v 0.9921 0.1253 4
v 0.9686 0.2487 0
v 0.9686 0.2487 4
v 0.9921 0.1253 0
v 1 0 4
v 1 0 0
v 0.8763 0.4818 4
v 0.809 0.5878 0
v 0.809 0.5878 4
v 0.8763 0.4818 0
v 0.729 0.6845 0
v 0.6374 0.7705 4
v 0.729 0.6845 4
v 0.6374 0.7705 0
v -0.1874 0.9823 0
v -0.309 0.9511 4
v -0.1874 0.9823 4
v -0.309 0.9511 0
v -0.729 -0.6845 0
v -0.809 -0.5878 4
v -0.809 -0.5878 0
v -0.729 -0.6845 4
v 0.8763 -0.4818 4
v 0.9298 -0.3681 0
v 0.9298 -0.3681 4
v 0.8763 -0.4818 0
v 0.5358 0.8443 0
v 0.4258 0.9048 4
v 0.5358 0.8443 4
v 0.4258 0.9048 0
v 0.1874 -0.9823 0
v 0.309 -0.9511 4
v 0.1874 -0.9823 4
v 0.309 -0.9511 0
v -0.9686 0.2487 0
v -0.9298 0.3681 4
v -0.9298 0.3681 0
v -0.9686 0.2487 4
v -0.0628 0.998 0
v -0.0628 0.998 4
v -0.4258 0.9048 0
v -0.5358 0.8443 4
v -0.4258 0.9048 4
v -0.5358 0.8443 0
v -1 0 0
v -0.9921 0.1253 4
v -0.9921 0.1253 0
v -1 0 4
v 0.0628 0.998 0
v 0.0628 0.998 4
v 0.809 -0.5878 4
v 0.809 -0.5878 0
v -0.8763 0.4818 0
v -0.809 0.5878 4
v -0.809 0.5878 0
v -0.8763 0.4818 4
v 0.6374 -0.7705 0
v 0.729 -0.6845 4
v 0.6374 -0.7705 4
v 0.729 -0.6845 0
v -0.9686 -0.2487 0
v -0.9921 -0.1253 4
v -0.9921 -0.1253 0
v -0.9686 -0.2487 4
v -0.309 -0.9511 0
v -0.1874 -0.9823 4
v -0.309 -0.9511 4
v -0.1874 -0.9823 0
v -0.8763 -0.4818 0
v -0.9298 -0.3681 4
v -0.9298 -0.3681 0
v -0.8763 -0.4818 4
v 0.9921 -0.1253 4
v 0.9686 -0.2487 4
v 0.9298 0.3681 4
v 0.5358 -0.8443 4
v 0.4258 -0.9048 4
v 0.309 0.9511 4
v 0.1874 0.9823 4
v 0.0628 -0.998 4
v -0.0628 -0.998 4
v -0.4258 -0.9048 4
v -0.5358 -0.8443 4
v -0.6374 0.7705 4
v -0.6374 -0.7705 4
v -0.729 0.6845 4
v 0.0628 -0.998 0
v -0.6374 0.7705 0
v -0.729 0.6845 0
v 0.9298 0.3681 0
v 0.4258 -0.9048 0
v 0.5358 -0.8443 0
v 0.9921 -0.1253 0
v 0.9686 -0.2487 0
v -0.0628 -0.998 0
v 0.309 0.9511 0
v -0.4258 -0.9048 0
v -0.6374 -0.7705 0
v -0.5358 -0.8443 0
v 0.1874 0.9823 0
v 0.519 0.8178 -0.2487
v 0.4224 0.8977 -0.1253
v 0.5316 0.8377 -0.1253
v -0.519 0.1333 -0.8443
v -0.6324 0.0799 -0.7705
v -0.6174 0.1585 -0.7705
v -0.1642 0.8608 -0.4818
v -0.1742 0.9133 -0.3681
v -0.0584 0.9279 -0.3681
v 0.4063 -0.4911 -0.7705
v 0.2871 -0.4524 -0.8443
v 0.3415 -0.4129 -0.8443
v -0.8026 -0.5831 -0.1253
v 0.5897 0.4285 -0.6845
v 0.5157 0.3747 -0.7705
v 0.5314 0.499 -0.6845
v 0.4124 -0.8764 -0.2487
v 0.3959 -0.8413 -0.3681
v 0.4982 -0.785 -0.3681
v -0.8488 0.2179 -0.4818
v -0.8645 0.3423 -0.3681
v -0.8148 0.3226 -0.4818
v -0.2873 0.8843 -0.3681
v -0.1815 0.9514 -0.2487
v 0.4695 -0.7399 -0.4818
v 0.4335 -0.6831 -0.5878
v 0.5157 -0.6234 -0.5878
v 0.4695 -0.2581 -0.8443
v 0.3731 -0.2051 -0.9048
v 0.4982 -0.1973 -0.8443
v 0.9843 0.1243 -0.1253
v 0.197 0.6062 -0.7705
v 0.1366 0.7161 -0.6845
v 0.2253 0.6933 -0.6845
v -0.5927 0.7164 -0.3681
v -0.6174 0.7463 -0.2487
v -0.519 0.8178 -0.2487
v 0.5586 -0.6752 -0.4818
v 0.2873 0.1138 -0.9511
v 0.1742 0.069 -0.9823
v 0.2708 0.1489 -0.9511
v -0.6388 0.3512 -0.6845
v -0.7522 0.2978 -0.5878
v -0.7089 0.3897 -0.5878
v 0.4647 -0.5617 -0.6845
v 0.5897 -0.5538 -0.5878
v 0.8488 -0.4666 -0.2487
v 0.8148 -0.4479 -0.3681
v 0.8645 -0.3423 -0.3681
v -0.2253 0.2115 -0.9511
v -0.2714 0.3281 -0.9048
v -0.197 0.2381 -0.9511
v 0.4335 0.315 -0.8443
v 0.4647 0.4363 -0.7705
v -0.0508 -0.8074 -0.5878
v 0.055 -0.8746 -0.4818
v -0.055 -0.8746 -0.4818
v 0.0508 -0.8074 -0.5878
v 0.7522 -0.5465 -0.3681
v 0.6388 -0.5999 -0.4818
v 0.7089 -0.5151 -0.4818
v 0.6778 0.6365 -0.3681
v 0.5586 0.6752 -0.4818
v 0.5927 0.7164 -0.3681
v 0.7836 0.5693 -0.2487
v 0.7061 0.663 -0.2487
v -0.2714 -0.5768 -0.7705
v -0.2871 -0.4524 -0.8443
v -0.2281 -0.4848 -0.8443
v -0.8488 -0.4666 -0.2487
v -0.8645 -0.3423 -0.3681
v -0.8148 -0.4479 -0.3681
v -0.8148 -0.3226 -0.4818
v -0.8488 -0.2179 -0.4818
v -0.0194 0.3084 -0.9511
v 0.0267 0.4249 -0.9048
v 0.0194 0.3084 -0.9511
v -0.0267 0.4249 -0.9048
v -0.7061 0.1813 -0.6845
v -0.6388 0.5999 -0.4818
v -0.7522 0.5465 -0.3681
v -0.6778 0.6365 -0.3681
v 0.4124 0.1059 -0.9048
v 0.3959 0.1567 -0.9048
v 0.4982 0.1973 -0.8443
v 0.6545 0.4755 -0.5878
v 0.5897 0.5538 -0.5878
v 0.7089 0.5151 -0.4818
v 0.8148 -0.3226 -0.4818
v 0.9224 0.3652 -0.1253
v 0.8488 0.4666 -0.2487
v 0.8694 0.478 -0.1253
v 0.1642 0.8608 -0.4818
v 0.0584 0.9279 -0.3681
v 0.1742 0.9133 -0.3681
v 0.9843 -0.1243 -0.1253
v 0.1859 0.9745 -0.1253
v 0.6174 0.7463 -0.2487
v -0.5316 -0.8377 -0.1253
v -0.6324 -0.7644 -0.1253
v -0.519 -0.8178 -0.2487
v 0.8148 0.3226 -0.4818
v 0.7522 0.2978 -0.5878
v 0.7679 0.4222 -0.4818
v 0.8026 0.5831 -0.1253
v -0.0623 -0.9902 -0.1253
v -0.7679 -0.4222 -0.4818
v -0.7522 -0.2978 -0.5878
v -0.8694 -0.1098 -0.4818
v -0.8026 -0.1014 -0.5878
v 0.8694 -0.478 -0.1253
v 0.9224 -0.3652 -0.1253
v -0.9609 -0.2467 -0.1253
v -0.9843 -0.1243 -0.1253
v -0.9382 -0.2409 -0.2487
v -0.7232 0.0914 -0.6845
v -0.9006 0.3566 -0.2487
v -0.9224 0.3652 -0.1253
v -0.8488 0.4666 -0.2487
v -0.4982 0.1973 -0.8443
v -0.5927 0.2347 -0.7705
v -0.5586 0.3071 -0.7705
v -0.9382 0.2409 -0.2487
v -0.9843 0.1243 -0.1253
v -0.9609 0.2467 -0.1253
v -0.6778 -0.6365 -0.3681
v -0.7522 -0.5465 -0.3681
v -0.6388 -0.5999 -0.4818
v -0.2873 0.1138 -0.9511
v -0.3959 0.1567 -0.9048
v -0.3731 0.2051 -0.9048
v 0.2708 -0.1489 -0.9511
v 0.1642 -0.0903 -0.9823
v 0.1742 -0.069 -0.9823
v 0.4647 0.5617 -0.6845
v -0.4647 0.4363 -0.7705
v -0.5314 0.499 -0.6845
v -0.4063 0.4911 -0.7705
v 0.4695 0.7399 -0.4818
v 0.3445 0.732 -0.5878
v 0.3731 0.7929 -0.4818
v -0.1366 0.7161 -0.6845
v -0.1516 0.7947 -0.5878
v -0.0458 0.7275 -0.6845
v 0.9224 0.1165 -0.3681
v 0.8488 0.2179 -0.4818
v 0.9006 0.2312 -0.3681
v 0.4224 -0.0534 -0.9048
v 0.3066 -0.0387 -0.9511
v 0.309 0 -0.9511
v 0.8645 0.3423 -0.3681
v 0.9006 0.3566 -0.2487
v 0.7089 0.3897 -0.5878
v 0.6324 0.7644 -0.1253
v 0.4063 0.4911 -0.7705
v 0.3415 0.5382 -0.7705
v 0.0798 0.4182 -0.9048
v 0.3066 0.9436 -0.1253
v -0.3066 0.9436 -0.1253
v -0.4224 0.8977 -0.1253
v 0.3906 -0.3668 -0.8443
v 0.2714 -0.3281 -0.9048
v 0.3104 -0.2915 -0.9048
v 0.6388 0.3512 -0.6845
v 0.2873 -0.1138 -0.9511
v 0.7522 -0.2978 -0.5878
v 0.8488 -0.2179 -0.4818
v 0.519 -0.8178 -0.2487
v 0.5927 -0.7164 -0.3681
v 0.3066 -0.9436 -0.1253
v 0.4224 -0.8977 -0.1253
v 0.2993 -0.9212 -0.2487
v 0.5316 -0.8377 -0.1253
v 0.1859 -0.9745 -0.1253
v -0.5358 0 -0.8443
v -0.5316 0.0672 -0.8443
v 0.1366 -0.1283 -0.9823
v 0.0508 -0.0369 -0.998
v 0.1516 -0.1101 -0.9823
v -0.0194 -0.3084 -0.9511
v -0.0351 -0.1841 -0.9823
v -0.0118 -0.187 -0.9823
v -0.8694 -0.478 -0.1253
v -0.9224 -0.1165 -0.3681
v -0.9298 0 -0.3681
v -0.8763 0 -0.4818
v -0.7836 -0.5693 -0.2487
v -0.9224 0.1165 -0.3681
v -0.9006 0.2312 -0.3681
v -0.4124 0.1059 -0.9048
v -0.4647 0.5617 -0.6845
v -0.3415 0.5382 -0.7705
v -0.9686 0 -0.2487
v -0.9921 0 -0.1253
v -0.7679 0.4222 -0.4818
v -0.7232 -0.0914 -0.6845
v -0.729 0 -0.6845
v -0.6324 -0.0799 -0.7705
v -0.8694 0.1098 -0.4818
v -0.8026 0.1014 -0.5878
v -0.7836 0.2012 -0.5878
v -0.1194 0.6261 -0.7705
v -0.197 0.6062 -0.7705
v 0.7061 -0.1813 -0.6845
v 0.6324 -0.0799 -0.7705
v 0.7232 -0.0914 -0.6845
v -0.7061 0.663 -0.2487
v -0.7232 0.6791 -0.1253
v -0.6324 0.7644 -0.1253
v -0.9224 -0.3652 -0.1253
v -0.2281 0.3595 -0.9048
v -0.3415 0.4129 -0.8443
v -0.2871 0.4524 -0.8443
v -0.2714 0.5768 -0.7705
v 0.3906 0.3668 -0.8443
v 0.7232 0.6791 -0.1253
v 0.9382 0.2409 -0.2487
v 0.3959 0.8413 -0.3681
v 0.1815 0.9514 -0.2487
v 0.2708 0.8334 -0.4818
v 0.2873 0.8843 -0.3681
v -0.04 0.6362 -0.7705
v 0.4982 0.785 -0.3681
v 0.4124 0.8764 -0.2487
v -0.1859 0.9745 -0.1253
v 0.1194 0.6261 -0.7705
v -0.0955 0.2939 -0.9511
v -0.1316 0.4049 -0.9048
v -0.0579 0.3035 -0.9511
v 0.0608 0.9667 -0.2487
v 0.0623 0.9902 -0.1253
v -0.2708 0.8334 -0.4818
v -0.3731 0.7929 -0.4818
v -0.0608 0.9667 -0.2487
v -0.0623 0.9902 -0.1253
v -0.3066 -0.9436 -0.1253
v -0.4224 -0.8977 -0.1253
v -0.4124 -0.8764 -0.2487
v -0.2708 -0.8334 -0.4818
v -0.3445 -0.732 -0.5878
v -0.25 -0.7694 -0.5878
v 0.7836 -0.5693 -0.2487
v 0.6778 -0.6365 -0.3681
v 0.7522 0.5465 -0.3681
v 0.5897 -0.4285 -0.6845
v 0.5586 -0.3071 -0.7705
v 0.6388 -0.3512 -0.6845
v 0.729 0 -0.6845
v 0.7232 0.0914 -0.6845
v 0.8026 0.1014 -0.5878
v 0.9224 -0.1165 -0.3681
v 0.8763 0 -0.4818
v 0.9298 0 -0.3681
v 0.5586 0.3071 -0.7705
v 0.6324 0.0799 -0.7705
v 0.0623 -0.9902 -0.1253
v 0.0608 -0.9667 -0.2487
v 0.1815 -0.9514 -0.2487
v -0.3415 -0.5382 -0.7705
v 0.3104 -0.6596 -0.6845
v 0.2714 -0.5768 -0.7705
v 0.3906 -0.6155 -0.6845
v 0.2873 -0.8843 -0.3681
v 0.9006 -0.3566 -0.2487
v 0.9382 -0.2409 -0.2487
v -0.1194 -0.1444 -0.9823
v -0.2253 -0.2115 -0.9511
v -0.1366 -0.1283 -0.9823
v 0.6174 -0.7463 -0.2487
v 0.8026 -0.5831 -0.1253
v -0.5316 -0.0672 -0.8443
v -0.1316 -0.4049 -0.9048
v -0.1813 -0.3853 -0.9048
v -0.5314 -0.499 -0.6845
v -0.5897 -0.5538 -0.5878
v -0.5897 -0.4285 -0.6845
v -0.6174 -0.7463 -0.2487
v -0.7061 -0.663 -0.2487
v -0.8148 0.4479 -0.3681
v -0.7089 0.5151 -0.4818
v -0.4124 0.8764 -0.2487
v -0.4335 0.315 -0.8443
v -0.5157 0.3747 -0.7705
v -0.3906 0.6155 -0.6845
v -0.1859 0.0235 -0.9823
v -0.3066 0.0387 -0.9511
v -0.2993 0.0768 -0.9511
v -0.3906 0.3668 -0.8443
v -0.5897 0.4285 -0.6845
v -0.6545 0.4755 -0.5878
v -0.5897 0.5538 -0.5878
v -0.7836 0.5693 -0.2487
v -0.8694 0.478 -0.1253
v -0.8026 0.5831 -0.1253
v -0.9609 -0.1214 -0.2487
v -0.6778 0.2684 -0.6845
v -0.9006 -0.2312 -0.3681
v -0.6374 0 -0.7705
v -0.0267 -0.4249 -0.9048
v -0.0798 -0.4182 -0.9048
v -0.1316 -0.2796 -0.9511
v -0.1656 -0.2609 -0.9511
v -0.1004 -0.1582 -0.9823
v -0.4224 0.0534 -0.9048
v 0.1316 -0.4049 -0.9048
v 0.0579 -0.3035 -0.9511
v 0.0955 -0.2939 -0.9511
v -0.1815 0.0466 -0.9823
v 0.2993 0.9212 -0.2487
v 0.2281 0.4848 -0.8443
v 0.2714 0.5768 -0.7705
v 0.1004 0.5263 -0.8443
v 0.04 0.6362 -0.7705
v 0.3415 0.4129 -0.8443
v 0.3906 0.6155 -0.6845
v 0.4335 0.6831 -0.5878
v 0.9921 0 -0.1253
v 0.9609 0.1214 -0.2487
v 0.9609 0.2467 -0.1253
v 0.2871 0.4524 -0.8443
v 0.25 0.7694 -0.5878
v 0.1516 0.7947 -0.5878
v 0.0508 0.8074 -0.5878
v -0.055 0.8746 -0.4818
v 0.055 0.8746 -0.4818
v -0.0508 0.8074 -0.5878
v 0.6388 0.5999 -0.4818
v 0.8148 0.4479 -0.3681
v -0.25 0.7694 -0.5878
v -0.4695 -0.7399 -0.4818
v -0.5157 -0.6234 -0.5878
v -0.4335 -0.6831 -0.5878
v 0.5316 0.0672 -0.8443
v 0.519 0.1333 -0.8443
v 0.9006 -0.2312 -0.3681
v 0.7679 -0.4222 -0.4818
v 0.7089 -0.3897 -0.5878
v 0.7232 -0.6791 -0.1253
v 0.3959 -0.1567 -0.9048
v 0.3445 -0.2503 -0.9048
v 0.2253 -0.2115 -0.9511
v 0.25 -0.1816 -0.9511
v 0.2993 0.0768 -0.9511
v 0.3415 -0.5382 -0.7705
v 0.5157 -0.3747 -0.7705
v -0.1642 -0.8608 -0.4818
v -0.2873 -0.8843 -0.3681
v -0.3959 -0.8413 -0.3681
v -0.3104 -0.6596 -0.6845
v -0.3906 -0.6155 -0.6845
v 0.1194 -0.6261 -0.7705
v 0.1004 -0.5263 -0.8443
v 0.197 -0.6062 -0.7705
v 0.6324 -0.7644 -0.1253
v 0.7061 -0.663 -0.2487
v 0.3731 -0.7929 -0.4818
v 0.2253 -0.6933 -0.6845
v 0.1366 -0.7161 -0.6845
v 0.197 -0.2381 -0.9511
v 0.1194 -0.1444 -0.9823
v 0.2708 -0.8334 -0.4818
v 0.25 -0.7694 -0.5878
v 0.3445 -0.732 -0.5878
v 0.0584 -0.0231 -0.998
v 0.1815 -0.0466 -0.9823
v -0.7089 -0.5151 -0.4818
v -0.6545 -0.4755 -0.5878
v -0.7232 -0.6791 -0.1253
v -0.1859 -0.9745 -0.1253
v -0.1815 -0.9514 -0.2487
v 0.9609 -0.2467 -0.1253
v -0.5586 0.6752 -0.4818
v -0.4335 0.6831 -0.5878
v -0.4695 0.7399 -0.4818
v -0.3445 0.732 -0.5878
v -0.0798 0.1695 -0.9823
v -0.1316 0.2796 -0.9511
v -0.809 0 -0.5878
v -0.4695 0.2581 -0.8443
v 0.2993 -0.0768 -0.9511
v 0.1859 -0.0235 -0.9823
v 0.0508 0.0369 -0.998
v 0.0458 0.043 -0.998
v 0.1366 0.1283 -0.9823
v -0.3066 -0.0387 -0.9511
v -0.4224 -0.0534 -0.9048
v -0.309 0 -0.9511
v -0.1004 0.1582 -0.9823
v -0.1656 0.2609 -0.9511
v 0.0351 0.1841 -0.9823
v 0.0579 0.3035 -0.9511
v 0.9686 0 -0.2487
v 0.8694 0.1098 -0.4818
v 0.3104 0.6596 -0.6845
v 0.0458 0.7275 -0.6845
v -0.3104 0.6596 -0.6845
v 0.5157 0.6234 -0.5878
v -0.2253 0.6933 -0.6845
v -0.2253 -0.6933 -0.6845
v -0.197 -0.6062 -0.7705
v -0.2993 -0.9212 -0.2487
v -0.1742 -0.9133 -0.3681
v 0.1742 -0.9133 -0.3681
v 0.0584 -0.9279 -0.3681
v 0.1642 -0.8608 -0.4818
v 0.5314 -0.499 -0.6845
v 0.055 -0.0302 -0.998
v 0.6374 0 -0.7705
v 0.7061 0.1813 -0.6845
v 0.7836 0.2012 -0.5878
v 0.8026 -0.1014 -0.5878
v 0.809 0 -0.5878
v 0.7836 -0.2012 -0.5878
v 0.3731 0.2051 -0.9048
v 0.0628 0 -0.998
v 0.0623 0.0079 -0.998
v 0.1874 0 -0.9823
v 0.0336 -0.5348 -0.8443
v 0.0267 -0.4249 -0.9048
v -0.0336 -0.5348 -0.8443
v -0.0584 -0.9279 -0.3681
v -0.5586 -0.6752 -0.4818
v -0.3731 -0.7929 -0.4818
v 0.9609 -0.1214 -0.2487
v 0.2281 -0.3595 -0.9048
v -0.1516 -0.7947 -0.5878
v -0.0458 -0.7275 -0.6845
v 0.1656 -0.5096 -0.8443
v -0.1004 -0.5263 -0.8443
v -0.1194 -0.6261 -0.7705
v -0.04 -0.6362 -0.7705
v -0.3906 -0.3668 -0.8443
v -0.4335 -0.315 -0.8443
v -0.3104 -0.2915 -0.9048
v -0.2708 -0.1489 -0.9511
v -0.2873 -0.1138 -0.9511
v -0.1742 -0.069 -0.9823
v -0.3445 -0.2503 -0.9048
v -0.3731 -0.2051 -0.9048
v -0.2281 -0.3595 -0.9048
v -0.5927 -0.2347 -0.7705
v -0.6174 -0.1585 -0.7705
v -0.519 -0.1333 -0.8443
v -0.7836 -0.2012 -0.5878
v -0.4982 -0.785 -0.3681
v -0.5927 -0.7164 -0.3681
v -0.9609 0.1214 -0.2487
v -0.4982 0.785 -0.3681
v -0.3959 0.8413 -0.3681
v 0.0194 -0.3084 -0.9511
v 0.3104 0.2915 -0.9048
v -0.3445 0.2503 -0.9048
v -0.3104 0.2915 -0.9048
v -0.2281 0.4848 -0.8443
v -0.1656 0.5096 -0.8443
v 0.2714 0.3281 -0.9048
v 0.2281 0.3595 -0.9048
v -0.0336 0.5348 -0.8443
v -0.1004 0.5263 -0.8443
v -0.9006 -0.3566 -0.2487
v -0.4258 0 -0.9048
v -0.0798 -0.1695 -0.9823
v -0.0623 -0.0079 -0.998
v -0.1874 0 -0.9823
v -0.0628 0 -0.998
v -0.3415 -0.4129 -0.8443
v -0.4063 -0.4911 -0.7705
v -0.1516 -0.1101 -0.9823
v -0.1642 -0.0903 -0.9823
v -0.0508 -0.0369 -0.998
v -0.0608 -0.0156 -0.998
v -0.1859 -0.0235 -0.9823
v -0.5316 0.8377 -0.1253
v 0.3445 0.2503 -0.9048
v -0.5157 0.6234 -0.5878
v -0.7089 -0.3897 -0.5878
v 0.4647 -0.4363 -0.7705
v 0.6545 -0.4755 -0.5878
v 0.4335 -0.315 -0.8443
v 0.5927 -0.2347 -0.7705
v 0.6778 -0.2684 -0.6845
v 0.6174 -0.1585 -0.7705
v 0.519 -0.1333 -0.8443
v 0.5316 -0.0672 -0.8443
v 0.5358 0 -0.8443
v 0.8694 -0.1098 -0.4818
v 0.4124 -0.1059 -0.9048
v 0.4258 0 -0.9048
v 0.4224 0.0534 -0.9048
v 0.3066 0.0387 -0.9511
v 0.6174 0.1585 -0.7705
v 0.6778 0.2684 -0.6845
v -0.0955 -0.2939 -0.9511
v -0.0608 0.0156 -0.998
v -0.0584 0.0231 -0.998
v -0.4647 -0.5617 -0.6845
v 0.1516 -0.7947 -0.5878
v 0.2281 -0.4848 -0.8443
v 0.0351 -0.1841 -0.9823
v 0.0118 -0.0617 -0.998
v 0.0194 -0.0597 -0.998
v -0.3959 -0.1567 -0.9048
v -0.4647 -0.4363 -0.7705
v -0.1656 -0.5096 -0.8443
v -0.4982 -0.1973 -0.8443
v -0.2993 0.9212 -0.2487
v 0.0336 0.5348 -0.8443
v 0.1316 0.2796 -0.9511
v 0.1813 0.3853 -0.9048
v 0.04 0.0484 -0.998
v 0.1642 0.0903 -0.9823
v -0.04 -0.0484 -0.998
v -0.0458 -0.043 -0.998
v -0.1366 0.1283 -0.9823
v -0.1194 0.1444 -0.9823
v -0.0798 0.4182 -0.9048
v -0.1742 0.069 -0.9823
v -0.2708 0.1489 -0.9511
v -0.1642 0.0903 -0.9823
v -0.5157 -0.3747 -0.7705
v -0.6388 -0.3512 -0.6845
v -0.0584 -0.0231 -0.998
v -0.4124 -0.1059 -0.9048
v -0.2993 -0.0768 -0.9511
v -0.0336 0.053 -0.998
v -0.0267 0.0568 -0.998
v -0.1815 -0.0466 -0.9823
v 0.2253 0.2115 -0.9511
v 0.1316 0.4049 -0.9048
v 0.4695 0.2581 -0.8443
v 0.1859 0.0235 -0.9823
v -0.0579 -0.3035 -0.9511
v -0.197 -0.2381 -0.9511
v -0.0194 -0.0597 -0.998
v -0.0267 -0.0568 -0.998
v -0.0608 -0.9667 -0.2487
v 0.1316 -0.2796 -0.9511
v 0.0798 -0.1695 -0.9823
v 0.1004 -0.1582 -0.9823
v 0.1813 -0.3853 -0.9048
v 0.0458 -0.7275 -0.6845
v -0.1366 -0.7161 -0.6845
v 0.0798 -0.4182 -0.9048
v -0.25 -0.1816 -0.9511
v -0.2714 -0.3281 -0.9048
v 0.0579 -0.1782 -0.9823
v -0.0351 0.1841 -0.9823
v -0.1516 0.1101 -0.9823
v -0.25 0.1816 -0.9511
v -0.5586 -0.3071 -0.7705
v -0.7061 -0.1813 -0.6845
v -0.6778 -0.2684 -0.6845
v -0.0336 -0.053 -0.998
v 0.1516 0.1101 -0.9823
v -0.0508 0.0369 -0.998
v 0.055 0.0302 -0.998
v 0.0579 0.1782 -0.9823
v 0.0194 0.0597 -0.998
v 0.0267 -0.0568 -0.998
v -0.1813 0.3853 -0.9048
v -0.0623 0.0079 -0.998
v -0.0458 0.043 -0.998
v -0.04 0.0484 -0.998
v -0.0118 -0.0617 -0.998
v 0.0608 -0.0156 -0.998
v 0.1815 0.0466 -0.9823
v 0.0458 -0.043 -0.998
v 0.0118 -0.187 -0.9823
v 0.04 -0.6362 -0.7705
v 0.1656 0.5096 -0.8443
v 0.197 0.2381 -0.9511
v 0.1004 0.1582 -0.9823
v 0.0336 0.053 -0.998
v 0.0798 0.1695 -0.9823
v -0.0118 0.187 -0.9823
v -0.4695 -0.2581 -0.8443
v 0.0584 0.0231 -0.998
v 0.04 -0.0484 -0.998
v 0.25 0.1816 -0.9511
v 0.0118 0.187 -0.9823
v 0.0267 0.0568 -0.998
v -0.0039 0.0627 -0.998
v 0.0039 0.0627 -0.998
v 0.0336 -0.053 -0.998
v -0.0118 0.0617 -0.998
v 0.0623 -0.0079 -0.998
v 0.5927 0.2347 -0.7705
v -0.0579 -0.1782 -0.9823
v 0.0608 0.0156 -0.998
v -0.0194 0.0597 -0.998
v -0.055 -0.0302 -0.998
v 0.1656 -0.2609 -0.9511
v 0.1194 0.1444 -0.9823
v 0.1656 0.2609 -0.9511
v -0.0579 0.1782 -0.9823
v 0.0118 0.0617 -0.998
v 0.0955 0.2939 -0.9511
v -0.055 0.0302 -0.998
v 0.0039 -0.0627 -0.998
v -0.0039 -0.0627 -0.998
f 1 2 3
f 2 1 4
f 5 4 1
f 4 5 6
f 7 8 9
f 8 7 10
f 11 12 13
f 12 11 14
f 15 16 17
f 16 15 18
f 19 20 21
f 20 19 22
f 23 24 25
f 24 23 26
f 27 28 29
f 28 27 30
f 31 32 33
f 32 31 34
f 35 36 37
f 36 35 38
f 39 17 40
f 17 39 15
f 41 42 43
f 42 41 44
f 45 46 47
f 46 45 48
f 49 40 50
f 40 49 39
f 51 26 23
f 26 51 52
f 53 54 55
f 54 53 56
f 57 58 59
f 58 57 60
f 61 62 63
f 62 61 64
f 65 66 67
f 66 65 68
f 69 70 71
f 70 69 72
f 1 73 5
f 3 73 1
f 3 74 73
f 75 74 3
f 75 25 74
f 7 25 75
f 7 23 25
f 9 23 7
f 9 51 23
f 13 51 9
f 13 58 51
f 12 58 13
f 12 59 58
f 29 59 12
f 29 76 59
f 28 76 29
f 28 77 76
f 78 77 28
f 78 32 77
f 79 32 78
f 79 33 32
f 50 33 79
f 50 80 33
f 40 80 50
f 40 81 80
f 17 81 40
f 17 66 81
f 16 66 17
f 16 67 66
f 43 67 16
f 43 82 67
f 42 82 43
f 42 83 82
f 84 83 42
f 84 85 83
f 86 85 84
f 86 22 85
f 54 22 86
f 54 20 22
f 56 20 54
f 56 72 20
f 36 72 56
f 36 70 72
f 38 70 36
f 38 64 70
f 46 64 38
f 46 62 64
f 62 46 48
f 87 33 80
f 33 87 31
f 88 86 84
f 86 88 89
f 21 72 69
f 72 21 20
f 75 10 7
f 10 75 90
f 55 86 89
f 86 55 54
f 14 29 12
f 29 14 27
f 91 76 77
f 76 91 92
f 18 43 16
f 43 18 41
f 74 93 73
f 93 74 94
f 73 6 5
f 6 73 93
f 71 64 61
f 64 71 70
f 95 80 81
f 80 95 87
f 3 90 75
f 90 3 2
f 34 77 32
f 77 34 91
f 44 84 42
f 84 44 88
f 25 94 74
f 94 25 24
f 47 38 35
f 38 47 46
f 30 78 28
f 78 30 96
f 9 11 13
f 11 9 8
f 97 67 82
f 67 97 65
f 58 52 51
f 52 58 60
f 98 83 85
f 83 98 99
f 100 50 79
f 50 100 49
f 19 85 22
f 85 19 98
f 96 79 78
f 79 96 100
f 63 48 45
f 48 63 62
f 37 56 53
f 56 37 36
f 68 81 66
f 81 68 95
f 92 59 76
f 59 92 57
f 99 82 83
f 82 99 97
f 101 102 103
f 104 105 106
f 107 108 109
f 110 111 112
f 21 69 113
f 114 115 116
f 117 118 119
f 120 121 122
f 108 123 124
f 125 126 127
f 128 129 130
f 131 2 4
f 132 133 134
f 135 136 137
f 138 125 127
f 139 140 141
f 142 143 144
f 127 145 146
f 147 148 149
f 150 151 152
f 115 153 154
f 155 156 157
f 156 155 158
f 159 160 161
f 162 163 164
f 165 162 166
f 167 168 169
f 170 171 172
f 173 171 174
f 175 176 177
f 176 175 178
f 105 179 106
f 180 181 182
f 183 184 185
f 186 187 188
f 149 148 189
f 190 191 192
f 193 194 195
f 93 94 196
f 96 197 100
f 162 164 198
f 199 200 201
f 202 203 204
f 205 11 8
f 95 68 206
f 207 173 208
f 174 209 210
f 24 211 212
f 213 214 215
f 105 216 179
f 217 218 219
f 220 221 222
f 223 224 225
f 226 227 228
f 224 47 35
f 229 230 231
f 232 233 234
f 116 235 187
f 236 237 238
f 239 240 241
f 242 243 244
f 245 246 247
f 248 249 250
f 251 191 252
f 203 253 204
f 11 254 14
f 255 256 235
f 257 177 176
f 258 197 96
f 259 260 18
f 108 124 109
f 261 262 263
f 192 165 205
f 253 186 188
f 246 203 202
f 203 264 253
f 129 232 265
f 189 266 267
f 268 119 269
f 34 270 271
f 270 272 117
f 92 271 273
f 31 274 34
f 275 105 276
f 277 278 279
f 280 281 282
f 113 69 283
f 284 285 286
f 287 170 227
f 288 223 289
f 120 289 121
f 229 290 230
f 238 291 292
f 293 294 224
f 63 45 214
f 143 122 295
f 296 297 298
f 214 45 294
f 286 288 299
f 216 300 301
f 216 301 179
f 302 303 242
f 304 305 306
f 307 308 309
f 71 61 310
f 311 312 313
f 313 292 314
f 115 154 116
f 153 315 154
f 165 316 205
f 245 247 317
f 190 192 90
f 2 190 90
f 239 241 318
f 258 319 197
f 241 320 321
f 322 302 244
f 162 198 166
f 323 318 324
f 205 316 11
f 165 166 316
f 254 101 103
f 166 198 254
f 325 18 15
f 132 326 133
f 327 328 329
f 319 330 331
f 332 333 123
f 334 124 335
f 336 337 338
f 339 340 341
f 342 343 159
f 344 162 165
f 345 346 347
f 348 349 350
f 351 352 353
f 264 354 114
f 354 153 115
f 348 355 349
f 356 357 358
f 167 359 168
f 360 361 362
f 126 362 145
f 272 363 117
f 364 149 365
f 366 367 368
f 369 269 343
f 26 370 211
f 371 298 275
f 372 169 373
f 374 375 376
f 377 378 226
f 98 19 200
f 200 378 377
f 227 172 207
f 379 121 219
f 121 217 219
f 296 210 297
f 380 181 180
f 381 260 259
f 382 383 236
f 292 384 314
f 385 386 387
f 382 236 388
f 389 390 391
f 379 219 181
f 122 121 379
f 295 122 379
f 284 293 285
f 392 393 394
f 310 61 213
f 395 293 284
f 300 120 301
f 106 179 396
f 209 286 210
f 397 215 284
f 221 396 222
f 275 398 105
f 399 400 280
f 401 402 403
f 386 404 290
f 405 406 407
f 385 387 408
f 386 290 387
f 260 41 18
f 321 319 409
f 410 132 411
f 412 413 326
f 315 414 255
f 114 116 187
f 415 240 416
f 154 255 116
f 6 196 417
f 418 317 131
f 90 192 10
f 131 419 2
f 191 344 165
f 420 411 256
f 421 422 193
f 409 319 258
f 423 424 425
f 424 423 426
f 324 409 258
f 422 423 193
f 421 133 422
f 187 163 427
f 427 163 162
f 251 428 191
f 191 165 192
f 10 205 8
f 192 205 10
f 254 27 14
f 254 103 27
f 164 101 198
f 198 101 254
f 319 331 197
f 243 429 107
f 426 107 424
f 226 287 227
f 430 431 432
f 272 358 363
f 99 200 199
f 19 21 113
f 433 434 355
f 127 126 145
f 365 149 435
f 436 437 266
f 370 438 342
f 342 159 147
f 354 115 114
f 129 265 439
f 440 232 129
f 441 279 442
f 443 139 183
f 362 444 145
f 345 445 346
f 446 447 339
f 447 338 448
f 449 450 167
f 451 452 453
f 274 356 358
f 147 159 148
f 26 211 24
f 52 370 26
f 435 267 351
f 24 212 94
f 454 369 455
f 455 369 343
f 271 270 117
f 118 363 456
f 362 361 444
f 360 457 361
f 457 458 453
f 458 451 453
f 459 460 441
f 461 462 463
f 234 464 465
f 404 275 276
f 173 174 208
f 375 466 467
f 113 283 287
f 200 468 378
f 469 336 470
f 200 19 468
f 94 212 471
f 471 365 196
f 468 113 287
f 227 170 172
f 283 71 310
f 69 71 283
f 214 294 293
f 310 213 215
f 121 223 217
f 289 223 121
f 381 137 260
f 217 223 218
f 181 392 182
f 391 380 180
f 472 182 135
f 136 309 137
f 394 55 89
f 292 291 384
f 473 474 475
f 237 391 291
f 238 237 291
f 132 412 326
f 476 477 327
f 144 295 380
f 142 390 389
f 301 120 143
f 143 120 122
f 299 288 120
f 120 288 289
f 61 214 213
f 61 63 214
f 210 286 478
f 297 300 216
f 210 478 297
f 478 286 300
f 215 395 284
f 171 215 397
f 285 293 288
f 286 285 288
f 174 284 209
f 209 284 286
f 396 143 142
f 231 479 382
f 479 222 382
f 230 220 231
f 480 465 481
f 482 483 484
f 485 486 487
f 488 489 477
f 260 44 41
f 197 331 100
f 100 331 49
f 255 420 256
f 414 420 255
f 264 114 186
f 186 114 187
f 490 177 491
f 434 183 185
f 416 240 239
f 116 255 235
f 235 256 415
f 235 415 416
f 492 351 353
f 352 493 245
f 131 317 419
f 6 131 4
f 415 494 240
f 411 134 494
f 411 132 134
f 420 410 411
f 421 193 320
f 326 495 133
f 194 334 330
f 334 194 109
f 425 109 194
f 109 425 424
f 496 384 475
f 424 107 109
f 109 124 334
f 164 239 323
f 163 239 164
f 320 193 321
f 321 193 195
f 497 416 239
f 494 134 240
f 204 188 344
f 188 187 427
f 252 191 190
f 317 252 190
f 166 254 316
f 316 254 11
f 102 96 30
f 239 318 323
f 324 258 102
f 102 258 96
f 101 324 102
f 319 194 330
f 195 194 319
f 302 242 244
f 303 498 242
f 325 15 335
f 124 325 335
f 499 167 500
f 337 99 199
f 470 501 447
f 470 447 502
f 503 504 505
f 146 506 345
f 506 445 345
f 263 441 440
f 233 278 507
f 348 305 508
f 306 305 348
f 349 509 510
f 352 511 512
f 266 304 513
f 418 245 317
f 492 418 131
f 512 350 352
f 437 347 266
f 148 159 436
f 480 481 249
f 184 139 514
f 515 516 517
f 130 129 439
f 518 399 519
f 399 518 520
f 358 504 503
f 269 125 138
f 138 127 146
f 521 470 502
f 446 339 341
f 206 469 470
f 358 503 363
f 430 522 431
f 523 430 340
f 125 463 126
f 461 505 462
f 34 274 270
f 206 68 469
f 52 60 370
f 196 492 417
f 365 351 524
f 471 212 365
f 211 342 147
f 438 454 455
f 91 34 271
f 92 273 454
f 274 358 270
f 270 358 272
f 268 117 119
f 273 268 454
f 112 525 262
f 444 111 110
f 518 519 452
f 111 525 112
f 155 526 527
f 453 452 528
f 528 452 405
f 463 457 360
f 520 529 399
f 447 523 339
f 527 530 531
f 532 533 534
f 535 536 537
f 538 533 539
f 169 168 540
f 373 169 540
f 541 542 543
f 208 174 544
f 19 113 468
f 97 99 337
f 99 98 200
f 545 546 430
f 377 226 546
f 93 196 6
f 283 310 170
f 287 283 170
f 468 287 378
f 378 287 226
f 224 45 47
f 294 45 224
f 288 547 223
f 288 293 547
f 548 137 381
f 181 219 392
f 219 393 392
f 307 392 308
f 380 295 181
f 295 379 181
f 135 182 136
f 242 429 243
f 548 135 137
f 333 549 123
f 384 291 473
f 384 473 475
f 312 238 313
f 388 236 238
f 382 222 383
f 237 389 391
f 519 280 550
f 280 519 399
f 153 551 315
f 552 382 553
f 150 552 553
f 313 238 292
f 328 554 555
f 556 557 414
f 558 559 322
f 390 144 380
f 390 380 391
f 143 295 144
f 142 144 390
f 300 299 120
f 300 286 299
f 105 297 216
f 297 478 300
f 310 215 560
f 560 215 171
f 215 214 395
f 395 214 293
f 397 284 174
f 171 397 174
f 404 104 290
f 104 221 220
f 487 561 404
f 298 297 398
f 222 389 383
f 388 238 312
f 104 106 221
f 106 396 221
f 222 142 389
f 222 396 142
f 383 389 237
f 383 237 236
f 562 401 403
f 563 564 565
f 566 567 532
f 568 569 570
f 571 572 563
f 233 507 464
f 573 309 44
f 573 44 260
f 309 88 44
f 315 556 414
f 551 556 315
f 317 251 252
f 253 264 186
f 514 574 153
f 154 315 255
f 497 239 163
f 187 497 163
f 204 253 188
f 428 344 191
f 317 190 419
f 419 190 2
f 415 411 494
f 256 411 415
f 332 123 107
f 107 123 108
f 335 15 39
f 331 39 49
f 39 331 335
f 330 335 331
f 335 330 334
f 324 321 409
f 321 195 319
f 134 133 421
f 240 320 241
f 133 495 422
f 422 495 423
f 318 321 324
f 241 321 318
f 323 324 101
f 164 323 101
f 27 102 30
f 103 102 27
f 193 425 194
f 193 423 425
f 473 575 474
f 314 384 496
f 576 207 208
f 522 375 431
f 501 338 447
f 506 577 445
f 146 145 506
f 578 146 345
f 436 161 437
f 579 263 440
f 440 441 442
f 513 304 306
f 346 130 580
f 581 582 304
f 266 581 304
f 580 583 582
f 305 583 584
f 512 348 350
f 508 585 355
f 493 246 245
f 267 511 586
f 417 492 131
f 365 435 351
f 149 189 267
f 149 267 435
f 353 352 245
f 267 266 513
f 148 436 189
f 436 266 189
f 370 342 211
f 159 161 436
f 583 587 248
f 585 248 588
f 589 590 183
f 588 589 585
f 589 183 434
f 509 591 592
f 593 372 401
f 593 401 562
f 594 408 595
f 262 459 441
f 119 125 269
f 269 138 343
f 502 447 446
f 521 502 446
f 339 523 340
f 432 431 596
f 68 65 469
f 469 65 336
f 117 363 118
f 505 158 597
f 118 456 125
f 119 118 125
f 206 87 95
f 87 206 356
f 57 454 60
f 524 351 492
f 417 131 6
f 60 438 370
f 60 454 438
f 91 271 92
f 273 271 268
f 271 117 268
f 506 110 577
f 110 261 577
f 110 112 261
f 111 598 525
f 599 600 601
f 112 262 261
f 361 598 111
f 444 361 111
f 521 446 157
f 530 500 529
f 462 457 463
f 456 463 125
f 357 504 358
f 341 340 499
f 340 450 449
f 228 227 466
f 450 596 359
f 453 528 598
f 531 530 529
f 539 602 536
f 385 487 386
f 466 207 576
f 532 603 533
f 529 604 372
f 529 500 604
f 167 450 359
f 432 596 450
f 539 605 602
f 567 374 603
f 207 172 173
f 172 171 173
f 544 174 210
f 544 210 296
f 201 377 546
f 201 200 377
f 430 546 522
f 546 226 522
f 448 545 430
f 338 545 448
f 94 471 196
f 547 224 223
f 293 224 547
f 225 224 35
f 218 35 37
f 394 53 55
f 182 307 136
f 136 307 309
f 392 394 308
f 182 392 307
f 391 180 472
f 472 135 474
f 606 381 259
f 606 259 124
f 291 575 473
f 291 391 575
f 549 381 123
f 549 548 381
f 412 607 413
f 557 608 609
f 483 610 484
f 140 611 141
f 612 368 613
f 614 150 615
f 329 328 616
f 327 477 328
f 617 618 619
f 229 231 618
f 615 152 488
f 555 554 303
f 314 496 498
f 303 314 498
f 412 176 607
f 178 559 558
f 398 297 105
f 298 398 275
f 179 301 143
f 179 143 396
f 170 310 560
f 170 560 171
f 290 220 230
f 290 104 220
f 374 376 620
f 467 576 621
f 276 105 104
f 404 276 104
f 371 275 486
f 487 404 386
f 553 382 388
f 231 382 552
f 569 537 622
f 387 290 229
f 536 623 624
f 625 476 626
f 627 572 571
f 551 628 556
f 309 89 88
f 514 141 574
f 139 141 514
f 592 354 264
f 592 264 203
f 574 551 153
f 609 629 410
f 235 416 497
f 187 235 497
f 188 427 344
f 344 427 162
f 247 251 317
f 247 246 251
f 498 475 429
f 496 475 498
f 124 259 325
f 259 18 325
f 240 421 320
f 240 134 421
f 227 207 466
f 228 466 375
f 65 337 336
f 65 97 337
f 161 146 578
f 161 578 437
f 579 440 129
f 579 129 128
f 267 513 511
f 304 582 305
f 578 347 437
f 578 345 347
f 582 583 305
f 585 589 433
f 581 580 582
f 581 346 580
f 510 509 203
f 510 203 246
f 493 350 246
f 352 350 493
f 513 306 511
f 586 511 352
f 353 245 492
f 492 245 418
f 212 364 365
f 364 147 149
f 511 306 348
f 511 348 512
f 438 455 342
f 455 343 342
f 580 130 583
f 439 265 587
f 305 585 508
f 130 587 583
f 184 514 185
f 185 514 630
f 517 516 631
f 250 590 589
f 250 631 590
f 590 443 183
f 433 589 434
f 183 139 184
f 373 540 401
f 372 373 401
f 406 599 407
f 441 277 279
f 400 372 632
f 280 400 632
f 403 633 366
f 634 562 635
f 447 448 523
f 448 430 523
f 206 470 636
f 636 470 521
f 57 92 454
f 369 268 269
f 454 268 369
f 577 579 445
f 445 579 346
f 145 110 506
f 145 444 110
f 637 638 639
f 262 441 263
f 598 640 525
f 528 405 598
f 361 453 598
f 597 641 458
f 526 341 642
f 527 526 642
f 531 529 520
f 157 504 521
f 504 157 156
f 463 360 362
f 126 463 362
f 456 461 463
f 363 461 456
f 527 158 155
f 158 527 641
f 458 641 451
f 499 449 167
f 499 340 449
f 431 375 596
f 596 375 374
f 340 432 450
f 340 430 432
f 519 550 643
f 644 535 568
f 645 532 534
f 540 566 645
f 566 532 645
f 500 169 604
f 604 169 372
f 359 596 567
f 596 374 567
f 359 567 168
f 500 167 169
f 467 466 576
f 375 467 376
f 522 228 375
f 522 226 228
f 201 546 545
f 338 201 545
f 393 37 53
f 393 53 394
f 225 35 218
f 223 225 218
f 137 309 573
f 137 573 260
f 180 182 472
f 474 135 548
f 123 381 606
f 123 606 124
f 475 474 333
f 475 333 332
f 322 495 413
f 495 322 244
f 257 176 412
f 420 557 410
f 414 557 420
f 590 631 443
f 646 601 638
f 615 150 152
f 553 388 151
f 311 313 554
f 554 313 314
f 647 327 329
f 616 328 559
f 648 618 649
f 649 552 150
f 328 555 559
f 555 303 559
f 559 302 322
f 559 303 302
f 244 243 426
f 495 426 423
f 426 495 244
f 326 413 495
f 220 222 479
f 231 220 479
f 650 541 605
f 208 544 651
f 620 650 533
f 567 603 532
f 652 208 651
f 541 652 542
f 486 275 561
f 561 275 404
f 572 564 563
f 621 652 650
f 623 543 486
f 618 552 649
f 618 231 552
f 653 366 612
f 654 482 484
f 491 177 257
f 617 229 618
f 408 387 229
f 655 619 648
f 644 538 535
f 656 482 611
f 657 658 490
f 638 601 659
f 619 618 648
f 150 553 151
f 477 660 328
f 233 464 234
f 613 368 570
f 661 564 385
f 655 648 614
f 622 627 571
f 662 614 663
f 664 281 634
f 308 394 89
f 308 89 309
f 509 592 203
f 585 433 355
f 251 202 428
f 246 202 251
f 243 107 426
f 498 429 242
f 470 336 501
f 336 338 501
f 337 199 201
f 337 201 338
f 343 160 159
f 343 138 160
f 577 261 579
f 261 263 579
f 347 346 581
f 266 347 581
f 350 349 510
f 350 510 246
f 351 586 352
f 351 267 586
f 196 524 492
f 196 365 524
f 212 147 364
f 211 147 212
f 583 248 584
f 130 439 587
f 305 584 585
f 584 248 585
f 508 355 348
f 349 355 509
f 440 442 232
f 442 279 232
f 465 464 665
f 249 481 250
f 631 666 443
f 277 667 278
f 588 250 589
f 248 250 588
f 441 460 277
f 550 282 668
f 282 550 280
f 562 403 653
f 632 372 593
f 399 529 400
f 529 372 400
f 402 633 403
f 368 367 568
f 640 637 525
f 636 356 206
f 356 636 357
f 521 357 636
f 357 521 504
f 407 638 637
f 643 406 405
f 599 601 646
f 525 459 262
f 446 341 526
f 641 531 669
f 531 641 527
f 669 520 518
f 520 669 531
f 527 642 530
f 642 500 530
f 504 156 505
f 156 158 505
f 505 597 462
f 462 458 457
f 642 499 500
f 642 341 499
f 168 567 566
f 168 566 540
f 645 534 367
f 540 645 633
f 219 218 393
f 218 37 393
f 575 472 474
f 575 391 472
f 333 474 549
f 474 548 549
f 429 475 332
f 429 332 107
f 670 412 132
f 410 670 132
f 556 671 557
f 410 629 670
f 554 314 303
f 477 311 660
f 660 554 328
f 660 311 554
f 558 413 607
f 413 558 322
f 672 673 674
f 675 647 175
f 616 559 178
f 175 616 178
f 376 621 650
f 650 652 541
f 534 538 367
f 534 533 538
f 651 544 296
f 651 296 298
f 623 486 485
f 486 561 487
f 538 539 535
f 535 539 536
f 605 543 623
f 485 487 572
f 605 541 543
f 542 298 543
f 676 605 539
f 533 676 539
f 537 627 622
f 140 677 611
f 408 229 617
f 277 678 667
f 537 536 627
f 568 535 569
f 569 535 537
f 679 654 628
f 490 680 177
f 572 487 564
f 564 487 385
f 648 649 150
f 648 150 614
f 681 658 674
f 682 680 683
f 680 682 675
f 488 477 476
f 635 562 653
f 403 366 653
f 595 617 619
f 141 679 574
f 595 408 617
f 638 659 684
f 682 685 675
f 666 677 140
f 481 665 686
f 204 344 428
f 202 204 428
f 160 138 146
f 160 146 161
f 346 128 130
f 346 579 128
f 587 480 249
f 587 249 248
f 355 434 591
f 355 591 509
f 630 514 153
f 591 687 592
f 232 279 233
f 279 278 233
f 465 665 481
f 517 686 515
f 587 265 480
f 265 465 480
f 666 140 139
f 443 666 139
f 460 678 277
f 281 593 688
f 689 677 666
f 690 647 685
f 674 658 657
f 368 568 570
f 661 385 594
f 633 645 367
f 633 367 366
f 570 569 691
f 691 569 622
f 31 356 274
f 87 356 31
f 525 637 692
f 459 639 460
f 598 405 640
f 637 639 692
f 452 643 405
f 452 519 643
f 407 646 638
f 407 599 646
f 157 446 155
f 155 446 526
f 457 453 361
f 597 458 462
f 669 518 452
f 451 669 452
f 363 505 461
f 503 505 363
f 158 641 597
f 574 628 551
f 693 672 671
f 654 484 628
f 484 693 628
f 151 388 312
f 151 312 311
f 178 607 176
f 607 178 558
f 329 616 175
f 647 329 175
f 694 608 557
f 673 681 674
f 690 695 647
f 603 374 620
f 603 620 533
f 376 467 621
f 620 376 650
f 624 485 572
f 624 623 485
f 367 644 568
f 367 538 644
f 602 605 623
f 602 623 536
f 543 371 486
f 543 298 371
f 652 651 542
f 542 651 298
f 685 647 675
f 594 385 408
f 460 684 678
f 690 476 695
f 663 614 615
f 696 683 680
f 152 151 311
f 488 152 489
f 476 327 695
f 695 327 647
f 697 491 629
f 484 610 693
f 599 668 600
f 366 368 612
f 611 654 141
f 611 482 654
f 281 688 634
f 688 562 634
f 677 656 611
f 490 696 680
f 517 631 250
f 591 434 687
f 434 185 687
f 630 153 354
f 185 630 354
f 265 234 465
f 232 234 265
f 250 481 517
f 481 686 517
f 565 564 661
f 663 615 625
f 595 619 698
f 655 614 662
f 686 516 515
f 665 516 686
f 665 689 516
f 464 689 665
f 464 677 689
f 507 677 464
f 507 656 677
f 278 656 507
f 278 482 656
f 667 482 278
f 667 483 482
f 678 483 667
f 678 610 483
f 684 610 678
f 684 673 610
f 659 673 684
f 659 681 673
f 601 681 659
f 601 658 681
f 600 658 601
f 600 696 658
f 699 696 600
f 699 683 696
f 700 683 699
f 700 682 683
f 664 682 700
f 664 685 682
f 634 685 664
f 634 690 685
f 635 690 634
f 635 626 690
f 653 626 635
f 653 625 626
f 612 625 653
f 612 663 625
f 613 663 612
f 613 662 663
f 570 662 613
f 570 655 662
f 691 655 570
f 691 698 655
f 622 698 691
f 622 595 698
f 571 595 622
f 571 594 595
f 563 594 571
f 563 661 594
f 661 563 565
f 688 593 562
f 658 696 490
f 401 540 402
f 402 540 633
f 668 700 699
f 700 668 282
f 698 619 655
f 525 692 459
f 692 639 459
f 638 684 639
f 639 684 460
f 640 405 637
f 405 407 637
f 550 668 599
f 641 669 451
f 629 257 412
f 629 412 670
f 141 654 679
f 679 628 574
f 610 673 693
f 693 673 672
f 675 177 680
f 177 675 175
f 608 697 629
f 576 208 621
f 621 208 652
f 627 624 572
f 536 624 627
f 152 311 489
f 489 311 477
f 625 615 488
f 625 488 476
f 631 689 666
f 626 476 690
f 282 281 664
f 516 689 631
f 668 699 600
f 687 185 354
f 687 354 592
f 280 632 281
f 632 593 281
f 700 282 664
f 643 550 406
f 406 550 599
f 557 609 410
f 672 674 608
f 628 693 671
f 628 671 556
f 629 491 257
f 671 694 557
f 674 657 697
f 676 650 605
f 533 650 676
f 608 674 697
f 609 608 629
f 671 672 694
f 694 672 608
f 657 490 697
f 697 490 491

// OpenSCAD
$fn = 50;
// body
*cylinder(h = 10, r1 = 4, r2 = 0);

// head
*translate([0, 0, 9])
  sphere(r=2.5);

// arms
cylinder(h = 4, r = 1);
sphere(r=1);
